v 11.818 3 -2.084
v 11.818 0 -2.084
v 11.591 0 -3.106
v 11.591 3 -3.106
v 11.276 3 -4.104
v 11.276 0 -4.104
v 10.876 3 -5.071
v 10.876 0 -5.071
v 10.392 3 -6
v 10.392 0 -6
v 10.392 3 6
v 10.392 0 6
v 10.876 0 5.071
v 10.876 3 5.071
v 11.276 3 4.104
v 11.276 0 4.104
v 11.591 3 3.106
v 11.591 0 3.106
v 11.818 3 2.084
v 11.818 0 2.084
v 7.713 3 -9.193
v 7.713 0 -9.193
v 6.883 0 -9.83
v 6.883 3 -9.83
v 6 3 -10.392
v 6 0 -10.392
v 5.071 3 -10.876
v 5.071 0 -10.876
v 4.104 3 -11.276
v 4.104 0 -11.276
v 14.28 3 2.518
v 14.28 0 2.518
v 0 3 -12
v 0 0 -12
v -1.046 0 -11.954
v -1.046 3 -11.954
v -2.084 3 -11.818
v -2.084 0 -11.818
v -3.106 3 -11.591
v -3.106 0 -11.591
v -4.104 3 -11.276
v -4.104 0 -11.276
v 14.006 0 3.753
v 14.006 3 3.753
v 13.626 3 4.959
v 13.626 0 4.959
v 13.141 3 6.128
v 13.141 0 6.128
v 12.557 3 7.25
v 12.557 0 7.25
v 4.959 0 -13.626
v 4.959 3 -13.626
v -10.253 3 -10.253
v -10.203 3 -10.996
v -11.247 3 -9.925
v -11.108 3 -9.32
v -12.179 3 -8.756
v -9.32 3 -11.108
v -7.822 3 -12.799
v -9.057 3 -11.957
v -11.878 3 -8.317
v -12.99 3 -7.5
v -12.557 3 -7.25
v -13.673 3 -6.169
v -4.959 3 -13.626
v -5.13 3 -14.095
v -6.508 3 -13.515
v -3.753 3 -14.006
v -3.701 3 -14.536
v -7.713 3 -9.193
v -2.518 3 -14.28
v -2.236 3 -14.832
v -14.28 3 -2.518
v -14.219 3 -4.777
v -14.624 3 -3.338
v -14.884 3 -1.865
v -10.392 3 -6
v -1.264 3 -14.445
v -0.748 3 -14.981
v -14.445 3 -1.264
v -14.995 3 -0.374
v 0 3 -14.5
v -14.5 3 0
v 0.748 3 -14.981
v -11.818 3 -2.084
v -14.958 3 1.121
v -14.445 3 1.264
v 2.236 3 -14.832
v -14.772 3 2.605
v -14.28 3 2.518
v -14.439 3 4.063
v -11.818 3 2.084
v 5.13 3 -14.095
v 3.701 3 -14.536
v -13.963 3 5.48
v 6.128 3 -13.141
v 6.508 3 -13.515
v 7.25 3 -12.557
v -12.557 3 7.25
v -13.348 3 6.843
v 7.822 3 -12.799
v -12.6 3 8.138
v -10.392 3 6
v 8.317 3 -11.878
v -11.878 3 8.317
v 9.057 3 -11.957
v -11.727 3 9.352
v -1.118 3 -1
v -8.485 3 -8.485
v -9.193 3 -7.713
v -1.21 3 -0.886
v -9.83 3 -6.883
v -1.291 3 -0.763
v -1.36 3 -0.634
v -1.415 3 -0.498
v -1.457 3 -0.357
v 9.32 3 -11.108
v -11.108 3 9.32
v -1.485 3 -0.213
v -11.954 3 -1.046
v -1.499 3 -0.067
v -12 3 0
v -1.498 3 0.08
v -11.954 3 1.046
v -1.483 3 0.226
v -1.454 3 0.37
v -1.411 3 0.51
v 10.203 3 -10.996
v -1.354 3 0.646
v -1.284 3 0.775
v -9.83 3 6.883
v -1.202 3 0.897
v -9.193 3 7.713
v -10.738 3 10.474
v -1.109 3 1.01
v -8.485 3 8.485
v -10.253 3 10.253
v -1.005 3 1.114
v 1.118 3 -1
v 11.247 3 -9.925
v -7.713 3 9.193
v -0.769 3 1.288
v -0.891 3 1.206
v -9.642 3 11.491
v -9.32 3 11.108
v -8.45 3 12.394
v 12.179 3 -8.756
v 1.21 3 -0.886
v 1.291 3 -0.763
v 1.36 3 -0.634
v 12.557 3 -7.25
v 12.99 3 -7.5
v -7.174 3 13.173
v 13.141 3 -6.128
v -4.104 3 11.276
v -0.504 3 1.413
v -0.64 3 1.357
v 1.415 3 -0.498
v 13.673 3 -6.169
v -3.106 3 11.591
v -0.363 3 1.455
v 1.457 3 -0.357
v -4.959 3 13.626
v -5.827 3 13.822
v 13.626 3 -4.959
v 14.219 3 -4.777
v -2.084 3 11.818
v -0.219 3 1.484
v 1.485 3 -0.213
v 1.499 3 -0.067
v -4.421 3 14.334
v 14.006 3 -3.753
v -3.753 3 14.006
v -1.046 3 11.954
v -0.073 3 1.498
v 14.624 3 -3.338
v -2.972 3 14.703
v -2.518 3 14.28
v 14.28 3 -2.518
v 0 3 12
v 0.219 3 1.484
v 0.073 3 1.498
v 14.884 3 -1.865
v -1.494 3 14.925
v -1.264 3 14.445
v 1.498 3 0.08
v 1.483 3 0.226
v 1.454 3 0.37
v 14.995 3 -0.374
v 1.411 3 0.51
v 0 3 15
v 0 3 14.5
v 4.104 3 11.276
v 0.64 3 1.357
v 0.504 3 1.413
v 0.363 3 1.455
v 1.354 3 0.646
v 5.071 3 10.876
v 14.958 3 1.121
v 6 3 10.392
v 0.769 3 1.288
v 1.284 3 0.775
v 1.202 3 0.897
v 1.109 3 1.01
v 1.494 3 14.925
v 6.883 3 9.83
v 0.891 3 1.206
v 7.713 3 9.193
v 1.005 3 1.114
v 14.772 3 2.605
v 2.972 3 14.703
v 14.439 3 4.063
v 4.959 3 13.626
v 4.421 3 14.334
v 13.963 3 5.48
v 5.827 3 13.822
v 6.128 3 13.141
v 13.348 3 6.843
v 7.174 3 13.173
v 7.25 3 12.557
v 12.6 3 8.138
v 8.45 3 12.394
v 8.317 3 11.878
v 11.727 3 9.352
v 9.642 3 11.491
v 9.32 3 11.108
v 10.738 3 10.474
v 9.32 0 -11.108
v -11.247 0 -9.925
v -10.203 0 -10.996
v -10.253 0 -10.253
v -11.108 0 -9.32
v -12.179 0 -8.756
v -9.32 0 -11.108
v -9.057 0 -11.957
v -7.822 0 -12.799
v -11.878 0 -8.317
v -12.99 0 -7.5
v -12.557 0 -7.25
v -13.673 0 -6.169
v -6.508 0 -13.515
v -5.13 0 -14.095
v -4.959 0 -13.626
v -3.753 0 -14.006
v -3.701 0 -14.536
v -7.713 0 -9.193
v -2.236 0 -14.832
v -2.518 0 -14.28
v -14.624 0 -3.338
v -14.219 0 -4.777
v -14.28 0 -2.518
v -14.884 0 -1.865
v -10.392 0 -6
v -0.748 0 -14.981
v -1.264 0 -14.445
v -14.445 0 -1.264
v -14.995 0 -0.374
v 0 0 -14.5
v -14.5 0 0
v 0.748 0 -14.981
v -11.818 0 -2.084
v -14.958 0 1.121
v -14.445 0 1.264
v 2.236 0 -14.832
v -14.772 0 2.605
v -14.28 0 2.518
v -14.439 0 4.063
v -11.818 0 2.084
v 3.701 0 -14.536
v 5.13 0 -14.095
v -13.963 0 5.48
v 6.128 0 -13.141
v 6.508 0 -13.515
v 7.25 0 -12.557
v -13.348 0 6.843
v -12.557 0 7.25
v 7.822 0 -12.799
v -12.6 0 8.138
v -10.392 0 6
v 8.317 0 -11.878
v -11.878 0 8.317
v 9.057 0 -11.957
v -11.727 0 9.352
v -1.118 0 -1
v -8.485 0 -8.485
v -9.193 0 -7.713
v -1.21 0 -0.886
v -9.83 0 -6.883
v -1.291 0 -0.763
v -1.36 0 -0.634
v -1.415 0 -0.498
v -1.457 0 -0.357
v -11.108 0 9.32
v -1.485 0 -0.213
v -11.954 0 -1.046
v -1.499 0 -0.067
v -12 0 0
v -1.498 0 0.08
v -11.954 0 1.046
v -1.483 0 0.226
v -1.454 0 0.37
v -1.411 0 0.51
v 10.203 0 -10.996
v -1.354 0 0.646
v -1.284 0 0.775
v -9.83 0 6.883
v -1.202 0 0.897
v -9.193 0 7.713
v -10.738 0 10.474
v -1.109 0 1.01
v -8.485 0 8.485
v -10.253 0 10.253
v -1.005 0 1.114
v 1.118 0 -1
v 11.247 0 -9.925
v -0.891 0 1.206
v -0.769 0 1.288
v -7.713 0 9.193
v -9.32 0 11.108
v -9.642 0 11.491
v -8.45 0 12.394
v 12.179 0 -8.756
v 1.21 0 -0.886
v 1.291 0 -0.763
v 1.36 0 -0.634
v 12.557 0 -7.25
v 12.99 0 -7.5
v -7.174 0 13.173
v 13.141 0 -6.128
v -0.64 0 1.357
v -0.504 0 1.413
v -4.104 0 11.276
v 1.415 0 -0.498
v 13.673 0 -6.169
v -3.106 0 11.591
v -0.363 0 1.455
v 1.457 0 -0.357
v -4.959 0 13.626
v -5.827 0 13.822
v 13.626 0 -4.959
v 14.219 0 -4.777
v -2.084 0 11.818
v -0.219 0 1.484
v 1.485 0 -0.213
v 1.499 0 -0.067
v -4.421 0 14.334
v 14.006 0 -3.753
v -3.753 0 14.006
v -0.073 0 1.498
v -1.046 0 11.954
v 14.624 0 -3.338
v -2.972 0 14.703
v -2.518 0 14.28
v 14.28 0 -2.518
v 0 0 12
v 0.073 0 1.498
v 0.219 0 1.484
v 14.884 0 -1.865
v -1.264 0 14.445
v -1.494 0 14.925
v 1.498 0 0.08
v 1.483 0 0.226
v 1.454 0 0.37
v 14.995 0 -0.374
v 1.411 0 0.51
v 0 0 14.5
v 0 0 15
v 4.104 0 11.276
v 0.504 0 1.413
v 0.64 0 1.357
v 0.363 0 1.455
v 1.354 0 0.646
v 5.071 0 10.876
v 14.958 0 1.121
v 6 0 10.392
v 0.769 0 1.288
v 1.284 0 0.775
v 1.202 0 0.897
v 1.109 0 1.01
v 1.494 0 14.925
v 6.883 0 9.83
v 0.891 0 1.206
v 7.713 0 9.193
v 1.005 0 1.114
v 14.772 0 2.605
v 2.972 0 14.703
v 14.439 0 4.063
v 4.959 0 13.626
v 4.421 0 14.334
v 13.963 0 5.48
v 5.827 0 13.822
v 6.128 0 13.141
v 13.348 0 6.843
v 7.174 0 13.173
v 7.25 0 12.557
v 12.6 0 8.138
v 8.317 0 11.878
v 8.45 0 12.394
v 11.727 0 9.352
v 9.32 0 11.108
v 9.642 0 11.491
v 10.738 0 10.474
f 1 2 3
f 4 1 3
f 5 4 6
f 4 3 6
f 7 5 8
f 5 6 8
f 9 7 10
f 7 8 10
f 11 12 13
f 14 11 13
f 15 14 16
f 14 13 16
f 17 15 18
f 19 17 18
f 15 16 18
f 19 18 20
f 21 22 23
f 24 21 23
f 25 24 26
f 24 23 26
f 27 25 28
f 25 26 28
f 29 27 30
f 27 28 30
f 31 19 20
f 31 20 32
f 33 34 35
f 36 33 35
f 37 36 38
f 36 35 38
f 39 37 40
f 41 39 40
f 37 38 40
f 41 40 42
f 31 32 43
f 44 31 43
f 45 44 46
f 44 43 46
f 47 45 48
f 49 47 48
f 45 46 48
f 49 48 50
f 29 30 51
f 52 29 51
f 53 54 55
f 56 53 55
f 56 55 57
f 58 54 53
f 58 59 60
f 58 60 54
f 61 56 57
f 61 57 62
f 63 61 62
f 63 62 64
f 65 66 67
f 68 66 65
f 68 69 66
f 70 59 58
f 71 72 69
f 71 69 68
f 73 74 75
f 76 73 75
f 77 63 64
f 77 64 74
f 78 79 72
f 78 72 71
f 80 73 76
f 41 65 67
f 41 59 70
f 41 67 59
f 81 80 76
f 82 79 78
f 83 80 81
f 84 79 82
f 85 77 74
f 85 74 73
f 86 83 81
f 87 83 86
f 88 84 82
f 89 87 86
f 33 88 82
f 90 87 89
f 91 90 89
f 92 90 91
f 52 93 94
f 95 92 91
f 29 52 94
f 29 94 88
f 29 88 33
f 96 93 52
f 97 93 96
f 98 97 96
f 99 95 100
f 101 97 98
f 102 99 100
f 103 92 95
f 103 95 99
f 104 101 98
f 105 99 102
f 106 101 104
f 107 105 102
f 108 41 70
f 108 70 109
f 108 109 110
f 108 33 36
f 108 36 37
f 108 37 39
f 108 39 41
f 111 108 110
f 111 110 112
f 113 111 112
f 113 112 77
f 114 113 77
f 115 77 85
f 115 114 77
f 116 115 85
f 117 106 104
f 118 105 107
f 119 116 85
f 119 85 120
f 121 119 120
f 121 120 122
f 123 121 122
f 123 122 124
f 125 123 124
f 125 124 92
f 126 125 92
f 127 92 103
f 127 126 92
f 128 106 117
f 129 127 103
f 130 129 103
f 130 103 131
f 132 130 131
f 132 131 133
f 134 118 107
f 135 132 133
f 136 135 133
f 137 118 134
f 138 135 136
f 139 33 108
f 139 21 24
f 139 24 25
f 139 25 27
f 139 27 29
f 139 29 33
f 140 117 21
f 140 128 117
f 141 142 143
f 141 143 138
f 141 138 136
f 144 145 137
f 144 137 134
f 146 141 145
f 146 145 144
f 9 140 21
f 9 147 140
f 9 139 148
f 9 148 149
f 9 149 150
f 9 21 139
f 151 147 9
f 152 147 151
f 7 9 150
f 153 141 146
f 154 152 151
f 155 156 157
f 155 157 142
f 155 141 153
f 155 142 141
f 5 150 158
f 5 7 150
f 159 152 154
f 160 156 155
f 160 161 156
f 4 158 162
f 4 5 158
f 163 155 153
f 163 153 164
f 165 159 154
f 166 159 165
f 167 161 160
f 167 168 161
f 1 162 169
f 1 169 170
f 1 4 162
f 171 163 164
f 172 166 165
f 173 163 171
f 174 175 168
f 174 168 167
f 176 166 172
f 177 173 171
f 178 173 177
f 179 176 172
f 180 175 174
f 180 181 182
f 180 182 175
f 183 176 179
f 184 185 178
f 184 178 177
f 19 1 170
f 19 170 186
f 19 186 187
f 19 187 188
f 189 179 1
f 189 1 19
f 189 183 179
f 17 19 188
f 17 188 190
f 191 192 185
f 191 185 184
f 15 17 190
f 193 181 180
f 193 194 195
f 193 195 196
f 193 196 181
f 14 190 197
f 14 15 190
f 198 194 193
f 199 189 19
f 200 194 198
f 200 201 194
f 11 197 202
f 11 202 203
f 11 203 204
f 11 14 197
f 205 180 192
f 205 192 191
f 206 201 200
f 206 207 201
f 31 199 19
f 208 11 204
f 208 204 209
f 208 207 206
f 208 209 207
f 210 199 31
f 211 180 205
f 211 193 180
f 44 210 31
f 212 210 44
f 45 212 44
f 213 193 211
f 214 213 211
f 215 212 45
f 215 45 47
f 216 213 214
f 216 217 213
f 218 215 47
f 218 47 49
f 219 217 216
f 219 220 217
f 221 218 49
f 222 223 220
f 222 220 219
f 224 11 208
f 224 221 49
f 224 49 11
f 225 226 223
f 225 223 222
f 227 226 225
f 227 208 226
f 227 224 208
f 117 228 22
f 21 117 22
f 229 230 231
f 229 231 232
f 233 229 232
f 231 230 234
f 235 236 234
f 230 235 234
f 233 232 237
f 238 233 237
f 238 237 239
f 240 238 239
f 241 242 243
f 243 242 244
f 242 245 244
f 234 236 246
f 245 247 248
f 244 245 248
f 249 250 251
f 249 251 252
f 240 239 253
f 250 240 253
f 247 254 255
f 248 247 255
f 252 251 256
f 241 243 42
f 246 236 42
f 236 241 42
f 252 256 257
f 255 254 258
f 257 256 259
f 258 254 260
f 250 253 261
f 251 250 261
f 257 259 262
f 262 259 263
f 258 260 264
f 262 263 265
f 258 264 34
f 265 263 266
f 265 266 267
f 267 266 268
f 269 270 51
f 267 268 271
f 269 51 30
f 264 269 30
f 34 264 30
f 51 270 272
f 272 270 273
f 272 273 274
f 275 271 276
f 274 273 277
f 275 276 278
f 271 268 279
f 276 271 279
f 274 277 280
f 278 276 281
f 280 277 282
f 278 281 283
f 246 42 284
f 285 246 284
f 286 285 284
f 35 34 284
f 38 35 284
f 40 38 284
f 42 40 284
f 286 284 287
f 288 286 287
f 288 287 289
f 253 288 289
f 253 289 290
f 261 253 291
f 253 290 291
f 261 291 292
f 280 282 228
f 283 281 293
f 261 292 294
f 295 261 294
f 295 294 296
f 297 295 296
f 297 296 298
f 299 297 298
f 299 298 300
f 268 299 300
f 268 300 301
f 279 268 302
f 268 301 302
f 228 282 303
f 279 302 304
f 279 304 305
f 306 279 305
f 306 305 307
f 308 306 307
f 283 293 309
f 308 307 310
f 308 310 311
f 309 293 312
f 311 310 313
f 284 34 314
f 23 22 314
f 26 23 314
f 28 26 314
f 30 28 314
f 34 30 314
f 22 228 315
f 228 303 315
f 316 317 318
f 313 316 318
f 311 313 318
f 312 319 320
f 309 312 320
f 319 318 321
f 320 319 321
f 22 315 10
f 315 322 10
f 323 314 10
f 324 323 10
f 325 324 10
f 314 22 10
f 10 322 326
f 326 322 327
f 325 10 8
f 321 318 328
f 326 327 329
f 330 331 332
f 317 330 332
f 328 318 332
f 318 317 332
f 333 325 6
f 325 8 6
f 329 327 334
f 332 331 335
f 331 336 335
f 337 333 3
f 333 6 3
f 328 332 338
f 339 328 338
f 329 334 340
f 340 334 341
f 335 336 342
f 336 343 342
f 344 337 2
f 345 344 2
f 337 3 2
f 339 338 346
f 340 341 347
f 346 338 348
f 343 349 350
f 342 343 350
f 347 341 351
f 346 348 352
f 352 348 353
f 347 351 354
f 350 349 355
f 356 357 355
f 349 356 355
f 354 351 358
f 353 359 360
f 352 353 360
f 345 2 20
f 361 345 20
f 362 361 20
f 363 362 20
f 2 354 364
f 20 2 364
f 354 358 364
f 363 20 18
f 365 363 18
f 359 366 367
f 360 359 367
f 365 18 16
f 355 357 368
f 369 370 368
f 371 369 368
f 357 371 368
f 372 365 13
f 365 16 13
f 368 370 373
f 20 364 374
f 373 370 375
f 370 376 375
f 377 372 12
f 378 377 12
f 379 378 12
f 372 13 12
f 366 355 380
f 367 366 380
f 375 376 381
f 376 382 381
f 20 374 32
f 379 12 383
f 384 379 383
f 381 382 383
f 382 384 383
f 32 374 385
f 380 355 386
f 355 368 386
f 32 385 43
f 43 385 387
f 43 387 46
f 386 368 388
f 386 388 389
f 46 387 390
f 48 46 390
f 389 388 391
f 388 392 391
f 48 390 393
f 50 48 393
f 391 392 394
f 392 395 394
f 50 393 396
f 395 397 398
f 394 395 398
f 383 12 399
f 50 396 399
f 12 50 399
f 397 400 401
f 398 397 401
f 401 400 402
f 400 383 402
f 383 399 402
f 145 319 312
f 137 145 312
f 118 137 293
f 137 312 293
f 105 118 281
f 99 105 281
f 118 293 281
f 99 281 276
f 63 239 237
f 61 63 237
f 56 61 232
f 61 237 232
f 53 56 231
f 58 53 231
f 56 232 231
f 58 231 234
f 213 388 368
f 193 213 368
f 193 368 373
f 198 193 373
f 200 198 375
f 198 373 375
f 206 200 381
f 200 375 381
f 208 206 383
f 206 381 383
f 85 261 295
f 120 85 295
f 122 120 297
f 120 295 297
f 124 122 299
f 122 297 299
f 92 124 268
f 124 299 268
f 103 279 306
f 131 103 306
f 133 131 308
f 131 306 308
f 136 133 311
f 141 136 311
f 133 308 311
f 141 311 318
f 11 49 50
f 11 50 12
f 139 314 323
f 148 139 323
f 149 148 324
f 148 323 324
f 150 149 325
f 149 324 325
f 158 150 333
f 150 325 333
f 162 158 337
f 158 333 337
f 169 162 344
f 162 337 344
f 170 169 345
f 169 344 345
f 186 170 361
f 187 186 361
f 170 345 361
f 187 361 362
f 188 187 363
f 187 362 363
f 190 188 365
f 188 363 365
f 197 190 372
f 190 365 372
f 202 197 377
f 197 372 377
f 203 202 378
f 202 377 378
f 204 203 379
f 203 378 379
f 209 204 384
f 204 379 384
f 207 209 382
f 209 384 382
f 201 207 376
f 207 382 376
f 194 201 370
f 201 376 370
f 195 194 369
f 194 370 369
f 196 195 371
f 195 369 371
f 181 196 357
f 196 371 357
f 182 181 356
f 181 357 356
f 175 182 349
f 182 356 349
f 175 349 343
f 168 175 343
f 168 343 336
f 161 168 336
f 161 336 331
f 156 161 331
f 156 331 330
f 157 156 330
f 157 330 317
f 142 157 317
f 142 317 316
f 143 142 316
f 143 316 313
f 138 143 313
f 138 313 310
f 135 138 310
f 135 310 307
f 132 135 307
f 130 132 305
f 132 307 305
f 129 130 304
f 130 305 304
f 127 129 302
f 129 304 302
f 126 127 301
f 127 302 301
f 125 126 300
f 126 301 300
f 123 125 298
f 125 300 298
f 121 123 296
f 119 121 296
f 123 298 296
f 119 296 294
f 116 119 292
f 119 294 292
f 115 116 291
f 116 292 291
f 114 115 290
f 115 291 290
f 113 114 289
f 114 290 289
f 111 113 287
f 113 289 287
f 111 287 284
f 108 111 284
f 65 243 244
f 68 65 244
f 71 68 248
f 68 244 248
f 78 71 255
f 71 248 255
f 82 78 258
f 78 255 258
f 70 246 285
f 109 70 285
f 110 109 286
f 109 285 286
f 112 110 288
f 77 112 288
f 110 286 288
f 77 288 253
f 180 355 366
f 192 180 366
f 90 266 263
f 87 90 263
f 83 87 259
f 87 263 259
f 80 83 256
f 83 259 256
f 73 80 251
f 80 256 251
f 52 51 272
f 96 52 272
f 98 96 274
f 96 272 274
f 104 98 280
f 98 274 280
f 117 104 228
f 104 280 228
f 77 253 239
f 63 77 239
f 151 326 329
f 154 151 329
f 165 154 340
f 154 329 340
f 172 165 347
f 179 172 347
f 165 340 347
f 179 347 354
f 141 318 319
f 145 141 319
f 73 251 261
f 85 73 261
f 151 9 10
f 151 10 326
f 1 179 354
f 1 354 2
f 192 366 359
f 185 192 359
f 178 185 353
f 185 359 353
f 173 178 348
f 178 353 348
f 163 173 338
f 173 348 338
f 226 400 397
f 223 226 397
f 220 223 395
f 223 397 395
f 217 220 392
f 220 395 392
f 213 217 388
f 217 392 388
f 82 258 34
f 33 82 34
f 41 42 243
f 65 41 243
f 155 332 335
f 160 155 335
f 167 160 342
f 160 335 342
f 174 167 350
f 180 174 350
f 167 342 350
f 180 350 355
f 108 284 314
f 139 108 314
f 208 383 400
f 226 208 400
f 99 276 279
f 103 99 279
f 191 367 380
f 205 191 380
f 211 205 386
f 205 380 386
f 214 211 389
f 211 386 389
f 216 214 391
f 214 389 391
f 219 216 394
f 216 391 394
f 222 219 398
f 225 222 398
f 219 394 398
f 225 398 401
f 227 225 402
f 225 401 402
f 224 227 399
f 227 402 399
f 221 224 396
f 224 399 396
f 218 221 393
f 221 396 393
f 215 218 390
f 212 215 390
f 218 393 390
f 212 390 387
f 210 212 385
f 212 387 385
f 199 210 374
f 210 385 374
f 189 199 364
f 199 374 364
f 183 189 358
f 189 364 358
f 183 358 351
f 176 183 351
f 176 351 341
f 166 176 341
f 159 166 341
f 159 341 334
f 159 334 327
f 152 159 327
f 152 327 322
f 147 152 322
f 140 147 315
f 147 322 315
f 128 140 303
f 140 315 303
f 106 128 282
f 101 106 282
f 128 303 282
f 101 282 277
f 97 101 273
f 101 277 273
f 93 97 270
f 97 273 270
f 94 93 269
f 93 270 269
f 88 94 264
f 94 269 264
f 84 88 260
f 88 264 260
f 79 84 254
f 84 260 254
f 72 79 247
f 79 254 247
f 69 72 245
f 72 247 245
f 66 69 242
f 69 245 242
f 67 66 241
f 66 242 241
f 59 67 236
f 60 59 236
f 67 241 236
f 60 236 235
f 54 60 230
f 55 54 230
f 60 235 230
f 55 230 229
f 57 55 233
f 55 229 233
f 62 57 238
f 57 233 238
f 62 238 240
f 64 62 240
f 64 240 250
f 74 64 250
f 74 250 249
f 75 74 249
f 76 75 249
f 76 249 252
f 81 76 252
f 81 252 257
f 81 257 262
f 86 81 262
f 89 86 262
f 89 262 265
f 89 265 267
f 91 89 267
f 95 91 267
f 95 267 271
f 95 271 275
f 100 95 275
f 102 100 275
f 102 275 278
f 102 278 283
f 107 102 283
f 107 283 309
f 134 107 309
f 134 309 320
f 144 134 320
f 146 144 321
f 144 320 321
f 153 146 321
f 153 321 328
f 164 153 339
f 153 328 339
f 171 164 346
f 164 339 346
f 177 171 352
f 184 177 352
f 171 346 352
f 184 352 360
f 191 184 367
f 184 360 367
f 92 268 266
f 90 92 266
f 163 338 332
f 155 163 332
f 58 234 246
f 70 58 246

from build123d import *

# Parameters (mm, degrees)
SKETCH1_R           = 15
BOSS_EXTRUDE1_DEPTH = 3


with BuildPart() as part:
    # Sketch1 → Boss-Extrude1 (new body)
    with BuildSketch(Plane(origin=(0, 0, 0), x_dir=(1, 0, 0), z_dir=(0, 1, 0))):
        with Locations(Location((0, 0, 0), (0, 0, 270))):
            Circle(SKETCH1_R)
        with BuildLine():
            Line((-1.118033989, 1), (1.118033989, 1))
            ThreePointArc((1.118033989, 1), (0, -1.5), (-1.118033989, 1))
        make_face(mode=Mode.SUBTRACT)
        with BuildLine():
            Line((-12.557368355, -7.25), (-10.392304845, -6))
            ThreePointArc((-10.392304845, -6), (-9.192533317, -7.713451316), (-7.713451316, -9.192533317))
            Line((-7.713451316, -9.192533317), (-9.32042034, -11.107644425))
            ThreePointArc((-9.32042034, -11.107644425), (-11.107644425, -9.32042034), (-12.557368355, -7.25))
        make_face(mode=Mode.SUBTRACT)
        with BuildLine():
            Line((-4.959292078, -13.625543001), (-4.10424172, -11.276311449))
            ThreePointArc((-4.10424172, -11.276311449), (-2.083778132, -11.817693036), (0, -12))
            Line((0, -12), (0, -14.5))
            ThreePointArc((0, -14.5), (-2.517898576, -14.279712419), (-4.959292078, -13.625543001))
        make_face(mode=Mode.SUBTRACT)
        with BuildLine():
            Line((4.959292078, -13.625543001), (4.10424172, -11.276311449))
            ThreePointArc((4.10424172, -11.276311449), (6, -10.392304845), (7.713451316, -9.192533317))
            Line((7.713451316, -9.192533317), (9.32042034, -11.107644425))
            ThreePointArc((9.32042034, -11.107644425), (7.25, -12.557368355), (4.959292078, -13.625543001))
        make_face(mode=Mode.SUBTRACT)
        with BuildLine():
            Line((12.557368355, -7.25), (10.392304845, -6))
            ThreePointArc((10.392304845, -6), (11.276311449, -4.10424172), (11.817693036, -2.083778132))
            Line((11.817693036, -2.083778132), (14.279712419, -2.517898576))
            ThreePointArc((14.279712419, -2.517898576), (13.625543001, -4.959292078), (12.557368355, -7.25))
        make_face(mode=Mode.SUBTRACT)
        with BuildLine():
            Line((-14.279712419, 2.517898576), (-11.817693036, 2.083778132))
            ThreePointArc((-11.817693036, 2.083778132), (-12, 0), (-11.817693036, -2.083778132))
            Line((-11.817693036, -2.083778132), (-14.279712419, -2.517898576))
            ThreePointArc((-14.279712419, -2.517898576), (-14.5, 0), (-14.279712419, 2.517898576))
        make_face(mode=Mode.SUBTRACT)
        with BuildLine():
            Line((-9.32042034, 11.107644425), (-7.713451316, 9.192533317))
            ThreePointArc((-7.713451316, 9.192533317), (-9.192533317, 7.713451316), (-10.392304845, 6))
            Line((-10.392304845, 6), (-12.557368355, 7.25))
            ThreePointArc((-12.557368355, 7.25), (-11.107644425, 9.32042034), (-9.32042034, 11.107644425))
        make_face(mode=Mode.SUBTRACT)
        with BuildLine():
            Line((-4.10424172, 11.276311449), (-4.959292078, 13.625543001))
            ThreePointArc((-4.959292078, 13.625543001), (-2.517898576, 14.279712419), (0, 14.5))
            Line((0, 14.5), (0, 12))
            ThreePointArc((0, 12), (-2.083778132, 11.817693036), (-4.10424172, 11.276311449))
        make_face(mode=Mode.SUBTRACT)
        with BuildLine():
            ThreePointArc((11.817693036, 2.083778132), (11.276311449, 4.10424172), (10.392304845, 6))
            Line((10.392304845, 6), (12.557368355, 7.25))
            ThreePointArc((12.557368355, 7.25), (13.625543001, 4.959292078), (14.279712419, 2.517898576))
            Line((14.279712419, 2.517898576), (11.817693036, 2.083778132))
        make_face(mode=Mode.SUBTRACT)
        with BuildLine():
            Line((9.32042034, 11.107644425), (7.713451316, 9.192533317))
            ThreePointArc((7.713451316, 9.192533317), (6, 10.392304845), (4.10424172, 11.276311449))
            Line((4.10424172, 11.276311449), (4.959292078, 13.625543001))
            ThreePointArc((4.959292078, 13.625543001), (7.25, 12.557368355), (9.32042034, 11.107644425))
        make_face(mode=Mode.SUBTRACT)
    extrude(amount=BOSS_EXTRUDE1_DEPTH)


solid = part.part
